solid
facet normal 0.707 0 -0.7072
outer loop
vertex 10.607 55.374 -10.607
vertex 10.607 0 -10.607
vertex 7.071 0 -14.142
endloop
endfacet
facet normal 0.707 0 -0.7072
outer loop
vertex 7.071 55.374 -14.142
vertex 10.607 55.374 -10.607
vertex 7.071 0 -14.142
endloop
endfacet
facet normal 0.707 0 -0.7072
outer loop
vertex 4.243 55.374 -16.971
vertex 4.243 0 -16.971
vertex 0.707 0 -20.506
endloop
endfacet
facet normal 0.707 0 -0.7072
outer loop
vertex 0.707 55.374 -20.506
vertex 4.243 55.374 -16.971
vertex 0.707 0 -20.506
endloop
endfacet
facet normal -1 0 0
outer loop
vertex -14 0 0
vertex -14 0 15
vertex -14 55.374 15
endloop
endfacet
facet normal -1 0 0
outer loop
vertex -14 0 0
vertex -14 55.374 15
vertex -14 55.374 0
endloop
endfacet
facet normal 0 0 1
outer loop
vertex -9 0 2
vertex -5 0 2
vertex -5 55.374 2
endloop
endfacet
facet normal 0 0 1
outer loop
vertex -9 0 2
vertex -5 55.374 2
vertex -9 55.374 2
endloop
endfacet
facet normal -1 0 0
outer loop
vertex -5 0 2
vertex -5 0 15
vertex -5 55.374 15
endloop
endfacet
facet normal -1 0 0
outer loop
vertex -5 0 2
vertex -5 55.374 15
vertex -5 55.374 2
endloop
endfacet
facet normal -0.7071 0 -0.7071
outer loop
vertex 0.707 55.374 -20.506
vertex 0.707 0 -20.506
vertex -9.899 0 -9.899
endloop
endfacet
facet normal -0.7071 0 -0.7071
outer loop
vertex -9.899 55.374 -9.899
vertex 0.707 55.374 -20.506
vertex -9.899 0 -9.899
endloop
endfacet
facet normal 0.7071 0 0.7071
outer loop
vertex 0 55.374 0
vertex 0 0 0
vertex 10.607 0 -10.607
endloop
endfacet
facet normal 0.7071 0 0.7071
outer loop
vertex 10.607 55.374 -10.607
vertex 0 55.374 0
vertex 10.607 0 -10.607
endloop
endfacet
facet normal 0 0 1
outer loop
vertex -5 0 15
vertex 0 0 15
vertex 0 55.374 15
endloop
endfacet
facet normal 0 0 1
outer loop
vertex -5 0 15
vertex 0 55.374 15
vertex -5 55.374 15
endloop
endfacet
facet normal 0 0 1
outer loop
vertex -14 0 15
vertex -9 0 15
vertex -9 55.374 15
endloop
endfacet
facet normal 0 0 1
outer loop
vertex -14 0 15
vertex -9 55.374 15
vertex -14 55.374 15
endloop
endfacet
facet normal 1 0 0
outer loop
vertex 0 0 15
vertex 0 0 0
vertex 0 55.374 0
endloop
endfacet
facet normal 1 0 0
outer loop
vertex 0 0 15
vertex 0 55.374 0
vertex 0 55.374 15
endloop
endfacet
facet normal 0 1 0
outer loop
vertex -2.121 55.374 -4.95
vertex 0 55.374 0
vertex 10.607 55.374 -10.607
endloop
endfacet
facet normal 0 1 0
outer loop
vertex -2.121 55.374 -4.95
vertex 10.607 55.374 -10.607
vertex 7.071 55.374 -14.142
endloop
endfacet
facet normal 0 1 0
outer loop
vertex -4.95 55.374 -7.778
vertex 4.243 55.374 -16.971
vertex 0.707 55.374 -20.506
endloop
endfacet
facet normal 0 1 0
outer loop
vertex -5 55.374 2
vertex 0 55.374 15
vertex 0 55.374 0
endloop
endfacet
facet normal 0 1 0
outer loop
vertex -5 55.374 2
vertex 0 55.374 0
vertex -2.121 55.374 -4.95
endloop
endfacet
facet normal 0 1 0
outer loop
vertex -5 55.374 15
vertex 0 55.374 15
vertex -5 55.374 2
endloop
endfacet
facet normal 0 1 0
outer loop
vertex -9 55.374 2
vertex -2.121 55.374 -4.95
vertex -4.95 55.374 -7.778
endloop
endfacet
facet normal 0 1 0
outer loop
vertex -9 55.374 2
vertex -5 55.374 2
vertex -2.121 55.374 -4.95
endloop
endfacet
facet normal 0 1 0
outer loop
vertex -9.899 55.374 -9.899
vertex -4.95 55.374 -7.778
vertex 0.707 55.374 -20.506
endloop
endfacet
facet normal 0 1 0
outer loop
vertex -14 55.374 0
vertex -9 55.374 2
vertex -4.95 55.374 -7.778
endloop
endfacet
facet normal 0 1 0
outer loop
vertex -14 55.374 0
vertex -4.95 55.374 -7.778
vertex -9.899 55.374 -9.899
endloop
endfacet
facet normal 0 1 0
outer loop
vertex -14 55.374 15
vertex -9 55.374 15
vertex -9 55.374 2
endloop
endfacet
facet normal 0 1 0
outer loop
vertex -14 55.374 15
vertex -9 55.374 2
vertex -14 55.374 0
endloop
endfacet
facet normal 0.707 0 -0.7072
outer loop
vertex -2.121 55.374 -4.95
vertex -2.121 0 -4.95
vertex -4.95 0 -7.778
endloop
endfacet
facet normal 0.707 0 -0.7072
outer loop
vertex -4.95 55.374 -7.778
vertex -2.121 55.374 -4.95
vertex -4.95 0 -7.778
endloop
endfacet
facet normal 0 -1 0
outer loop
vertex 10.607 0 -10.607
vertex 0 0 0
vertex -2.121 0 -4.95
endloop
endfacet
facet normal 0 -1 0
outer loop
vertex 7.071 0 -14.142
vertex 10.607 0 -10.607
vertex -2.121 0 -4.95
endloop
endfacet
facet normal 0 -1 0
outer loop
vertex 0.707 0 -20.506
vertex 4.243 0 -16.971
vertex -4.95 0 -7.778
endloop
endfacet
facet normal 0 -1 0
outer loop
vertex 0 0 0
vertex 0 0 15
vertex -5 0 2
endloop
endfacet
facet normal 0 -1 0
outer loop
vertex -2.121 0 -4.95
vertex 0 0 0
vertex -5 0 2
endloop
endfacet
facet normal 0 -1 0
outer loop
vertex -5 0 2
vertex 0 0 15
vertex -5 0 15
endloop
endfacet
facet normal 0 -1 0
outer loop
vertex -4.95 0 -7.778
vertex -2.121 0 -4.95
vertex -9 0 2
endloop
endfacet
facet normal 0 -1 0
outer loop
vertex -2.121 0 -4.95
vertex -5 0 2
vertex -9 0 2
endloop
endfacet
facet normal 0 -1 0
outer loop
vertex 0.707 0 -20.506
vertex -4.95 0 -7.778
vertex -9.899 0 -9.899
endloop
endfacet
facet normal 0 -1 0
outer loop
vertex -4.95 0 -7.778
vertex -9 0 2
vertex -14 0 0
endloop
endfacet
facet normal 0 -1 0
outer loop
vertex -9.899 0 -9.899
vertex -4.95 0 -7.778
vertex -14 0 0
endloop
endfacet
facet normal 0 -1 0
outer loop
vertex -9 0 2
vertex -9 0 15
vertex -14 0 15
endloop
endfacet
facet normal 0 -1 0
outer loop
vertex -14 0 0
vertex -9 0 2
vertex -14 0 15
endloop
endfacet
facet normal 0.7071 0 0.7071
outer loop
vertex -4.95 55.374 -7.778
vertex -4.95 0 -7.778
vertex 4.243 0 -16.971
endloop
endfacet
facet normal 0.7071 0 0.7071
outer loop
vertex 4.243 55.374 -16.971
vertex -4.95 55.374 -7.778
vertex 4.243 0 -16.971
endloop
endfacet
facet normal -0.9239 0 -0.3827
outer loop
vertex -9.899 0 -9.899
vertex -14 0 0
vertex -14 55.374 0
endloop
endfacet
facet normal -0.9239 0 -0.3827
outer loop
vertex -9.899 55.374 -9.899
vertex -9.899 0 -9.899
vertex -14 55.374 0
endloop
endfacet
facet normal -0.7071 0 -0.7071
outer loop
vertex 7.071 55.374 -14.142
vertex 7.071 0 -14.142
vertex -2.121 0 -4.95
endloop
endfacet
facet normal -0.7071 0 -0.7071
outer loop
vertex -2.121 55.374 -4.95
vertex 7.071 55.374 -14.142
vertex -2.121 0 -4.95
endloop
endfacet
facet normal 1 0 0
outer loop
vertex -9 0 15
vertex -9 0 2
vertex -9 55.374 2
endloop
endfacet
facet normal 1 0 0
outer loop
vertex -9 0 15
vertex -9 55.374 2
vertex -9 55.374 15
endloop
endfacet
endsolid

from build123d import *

# Parameters (mm, degrees)
BOSS_EXTRUDE1_DEPTH = 55.374093082
CHAMFER1_START      = -16
CHAMFER1_OUTLINE_W  = 58
CHAMFER1_OUTLINE_H  = 14
CHAMFER1_DEPTH      = 3.065686545


with BuildPart() as part:
    # Sketch2 → Boss-Extrude1 (new body)
    with BuildSketch(Plane(origin=(0, 0, 0), x_dir=(1, 0, 0), z_dir=(0, 1, 0))):
        Polygon((0, 0), (0, -15), (-5, -15), (-5, -2), (-9, -2), (-9, -15), (-14, -15), (-14, 5.798989873), align=None)
    boss_extrude1 = extrude(amount=BOSS_EXTRUDE1_DEPTH)

    # Mirror2: Boss-Extrude1 across plane
    add(boss_extrude1.mirror(Plane(origin=(0, 55.374093082, 0), x_dir=(0.9238795325112891, 0, 0.382683432365084), z_dir=(-0.382683432365084, 0, 0.9238795325112892))))

    # Chamfer1: read off the stored shape, not the designer's step
    # Chamfer1 outline → Chamfer1 (cut)
    with BuildSketch(Plane(origin=(0, 0, 0), x_dir=(0, 1, 0), z_dir=(0.9238795325112892, 0, 0.3826834323650841)).offset(CHAMFER1_START)):
        with Locations((28, 0)):
            Rectangle(CHAMFER1_OUTLINE_W, CHAMFER1_OUTLINE_H)
    extrude(amount=CHAMFER1_DEPTH, mode=Mode.SUBTRACT)


solid = part.part
